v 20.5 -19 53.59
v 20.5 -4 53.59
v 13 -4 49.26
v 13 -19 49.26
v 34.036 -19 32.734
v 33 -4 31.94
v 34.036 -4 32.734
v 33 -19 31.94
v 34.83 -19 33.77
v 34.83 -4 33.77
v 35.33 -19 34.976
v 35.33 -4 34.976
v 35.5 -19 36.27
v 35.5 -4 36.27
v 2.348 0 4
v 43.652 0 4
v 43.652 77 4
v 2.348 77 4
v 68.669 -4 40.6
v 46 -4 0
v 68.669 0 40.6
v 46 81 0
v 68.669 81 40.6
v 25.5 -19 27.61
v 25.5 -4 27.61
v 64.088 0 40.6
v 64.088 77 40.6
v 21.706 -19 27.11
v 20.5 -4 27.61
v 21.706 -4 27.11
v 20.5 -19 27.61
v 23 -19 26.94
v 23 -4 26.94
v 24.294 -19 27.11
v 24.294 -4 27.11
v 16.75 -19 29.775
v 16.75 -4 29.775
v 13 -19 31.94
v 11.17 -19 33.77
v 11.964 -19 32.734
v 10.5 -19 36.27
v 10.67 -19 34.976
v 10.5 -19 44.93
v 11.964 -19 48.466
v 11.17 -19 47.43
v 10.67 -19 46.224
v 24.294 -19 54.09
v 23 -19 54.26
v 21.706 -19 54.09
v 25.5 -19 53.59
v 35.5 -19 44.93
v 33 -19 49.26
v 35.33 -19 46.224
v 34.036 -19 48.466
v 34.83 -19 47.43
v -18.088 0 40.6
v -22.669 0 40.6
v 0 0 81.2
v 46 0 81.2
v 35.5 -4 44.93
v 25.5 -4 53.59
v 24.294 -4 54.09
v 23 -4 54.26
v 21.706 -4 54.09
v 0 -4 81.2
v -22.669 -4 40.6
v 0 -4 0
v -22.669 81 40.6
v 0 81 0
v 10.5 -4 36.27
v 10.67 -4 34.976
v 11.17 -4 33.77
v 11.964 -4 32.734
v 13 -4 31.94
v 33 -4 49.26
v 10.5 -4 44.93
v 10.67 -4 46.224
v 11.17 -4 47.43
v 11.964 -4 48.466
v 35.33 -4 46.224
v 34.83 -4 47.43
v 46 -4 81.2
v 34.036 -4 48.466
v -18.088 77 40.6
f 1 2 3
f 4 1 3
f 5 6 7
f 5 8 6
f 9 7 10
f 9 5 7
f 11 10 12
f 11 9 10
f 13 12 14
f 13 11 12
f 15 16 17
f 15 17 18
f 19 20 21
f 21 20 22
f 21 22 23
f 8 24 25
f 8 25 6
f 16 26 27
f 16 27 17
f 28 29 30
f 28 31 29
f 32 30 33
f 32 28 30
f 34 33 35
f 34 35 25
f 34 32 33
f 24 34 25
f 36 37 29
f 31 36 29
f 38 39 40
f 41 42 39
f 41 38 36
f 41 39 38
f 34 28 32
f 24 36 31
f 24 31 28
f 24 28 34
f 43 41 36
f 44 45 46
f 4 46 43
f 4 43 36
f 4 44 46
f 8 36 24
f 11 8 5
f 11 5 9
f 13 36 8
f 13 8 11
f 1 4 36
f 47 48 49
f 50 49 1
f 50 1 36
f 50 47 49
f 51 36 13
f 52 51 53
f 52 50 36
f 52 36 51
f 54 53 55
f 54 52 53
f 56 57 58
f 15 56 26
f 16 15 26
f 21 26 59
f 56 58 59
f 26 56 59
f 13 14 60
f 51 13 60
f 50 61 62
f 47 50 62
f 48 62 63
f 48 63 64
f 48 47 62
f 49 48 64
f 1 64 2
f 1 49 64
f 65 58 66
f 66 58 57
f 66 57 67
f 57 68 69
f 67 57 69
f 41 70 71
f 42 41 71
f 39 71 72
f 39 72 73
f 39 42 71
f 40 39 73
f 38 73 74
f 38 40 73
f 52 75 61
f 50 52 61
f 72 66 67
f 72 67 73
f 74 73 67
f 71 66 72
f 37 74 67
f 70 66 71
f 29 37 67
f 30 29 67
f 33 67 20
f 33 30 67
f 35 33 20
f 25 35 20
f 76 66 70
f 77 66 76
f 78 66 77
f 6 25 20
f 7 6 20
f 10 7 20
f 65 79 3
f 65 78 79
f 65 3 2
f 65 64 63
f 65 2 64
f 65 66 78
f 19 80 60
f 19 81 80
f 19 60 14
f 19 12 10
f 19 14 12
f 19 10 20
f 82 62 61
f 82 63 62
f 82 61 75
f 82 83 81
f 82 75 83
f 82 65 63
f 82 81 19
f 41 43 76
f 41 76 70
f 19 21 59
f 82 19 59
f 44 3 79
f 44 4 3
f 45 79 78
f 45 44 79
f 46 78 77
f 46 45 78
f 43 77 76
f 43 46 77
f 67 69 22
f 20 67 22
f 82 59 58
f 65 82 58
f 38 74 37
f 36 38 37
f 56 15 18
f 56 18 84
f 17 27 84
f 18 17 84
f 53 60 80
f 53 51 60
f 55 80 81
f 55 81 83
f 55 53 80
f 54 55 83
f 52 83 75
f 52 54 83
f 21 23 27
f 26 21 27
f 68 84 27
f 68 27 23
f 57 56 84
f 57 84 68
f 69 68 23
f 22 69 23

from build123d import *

# Parameters (mm, degrees)
F1_DEPTH = 4
F3_DEPTH = 15
F4_R     = 5
F6_DEPTH = 85
F8_DEPTH = 4


with BuildPart() as f1:
    # F0 (on Front) → F1 (new body)
    with BuildSketch(Plane.XZ):
        Polygon((-22.6691420217, 40.6), (0, 0), (23, 0), (46, 0), (68.6691420217, 40.6), (46, 81.2), (0, 81.2), align=None)
    extrude(amount=F1_DEPTH)

    # F2 (on face) → F3 (join)
    with BuildSketch(Plane.XZ.offset(4)):
        with BuildLine():
            ThreePointArc((29.2500001164, 29.7746825199), (33.8253175809, 34.3500000582), (35.5, 40.6))
            ThreePointArc((35.5, 40.6), (33.8253175809, 46.8499999418), (29.2500001164, 51.4253174801))
            ThreePointArc((29.2500001164, 51.4253174801), (23, 53.1), (16.7499998836, 51.4253174801))
            ThreePointArc((16.7499998836, 51.4253174801), (12.1746824191, 46.8499999418), (10.5, 40.6))
            ThreePointArc((10.5, 40.6), (12.1746825605, 34.3499998133), (16.7500003734, 29.7746822371))
            ThreePointArc((16.7500003734, 29.7746822371), (23.0000002828, 28.1), (29.2500001164, 29.7746825199))
        make_face()
        with BuildLine():
            Line((35.5, 33.3831216351), (35.5, 40.6))
            ThreePointArc((35.5, 40.6), (33.8253175809, 34.3500000582), (29.2500001164, 29.7746825199))
            Line((29.2500001164, 29.7746825199), (35.5, 33.3831216351))
        make_face()
        with BuildLine():
            ThreePointArc((29.2500001164, 51.4253174801), (33.8253175809, 46.8499999418), (35.5, 40.6))
            Line((35.5, 40.6), (35.5, 47.8168783649))
            Line((35.5, 47.8168783649), (29.2500001164, 51.4253174801))
        make_face()
        with BuildLine():
            ThreePointArc((16.7499998836, 51.4253174801), (23, 53.1), (29.2500001164, 51.4253174801))
            Line((29.2500001164, 51.4253174801), (23, 55.0337567297))
            Line((23, 55.0337567297), (16.7499998836, 51.4253174801))
        make_face()
        with BuildLine():
            Line((23, 26.1662432703), (29.2500001164, 29.7746825199))
            ThreePointArc((29.2500001164, 29.7746825199), (23.0000002828, 28.1), (16.7500003734, 29.7746822371))
            Line((16.7500003734, 29.7746822371), (23, 26.1662432703))
        make_face()
        with BuildLine():
            ThreePointArc((10.5, 40.6), (12.1746824191, 46.8499999418), (16.7499998836, 51.4253174801))
            Line((16.7499998836, 51.4253174801), (10.5, 47.8168783649))
            Line((10.5, 47.8168783649), (10.5, 40.6))
        make_face()
        with BuildLine():
            Line((10.5, 33.3831216351), (16.7500003734, 29.7746822371))
            ThreePointArc((16.7500003734, 29.7746822371), (12.1746825605, 34.3499998133), (10.5, 40.6))
            Line((10.5, 40.6), (10.5, 33.3831216351))
        make_face()
    extrude(amount=F3_DEPTH)

    # F4
    f4_edges = [f1.edges().sort_by_distance(p)[0] for p in [
        (35.5, -11.5, 47.816878),
        (23, -11.5, 55.033757),
        (10.5, -11.5, 47.816878),
        (35.5, -11.5, 33.383122),
        (23, -11.5, 26.166243),
        (10.5, -11.5, 33.383122),
    ]]
    fillet(f4_edges, radius=F4_R)

    # F5 (on face) → F6 (join)
    with BuildSketch(Plane.XZ.offset(4)):
        Polygon((64.0878597141, 40.6), (43.6521314402, 4.0000013266), (2.3478685598, 4.0000013266), (-18.0878597141, 40.6), (-22.6691420217, 40.6), (0, 0), (46, 0), (68.6691420217, 40.6), align=None)
    extrude(amount=-F6_DEPTH)

    # F7 (on face) → F8 (join)
    with BuildSketch(Plane(origin=(0, 81, 0), x_dir=(-1, 0, 0), z_dir=(0, 1, 0))):
        Polygon((22.6691420217, 40.6), (-68.6691420217, 40.6), (-46, 0), (0, 0), align=None)
    extrude(amount=-F8_DEPTH)


solid = f1.part
